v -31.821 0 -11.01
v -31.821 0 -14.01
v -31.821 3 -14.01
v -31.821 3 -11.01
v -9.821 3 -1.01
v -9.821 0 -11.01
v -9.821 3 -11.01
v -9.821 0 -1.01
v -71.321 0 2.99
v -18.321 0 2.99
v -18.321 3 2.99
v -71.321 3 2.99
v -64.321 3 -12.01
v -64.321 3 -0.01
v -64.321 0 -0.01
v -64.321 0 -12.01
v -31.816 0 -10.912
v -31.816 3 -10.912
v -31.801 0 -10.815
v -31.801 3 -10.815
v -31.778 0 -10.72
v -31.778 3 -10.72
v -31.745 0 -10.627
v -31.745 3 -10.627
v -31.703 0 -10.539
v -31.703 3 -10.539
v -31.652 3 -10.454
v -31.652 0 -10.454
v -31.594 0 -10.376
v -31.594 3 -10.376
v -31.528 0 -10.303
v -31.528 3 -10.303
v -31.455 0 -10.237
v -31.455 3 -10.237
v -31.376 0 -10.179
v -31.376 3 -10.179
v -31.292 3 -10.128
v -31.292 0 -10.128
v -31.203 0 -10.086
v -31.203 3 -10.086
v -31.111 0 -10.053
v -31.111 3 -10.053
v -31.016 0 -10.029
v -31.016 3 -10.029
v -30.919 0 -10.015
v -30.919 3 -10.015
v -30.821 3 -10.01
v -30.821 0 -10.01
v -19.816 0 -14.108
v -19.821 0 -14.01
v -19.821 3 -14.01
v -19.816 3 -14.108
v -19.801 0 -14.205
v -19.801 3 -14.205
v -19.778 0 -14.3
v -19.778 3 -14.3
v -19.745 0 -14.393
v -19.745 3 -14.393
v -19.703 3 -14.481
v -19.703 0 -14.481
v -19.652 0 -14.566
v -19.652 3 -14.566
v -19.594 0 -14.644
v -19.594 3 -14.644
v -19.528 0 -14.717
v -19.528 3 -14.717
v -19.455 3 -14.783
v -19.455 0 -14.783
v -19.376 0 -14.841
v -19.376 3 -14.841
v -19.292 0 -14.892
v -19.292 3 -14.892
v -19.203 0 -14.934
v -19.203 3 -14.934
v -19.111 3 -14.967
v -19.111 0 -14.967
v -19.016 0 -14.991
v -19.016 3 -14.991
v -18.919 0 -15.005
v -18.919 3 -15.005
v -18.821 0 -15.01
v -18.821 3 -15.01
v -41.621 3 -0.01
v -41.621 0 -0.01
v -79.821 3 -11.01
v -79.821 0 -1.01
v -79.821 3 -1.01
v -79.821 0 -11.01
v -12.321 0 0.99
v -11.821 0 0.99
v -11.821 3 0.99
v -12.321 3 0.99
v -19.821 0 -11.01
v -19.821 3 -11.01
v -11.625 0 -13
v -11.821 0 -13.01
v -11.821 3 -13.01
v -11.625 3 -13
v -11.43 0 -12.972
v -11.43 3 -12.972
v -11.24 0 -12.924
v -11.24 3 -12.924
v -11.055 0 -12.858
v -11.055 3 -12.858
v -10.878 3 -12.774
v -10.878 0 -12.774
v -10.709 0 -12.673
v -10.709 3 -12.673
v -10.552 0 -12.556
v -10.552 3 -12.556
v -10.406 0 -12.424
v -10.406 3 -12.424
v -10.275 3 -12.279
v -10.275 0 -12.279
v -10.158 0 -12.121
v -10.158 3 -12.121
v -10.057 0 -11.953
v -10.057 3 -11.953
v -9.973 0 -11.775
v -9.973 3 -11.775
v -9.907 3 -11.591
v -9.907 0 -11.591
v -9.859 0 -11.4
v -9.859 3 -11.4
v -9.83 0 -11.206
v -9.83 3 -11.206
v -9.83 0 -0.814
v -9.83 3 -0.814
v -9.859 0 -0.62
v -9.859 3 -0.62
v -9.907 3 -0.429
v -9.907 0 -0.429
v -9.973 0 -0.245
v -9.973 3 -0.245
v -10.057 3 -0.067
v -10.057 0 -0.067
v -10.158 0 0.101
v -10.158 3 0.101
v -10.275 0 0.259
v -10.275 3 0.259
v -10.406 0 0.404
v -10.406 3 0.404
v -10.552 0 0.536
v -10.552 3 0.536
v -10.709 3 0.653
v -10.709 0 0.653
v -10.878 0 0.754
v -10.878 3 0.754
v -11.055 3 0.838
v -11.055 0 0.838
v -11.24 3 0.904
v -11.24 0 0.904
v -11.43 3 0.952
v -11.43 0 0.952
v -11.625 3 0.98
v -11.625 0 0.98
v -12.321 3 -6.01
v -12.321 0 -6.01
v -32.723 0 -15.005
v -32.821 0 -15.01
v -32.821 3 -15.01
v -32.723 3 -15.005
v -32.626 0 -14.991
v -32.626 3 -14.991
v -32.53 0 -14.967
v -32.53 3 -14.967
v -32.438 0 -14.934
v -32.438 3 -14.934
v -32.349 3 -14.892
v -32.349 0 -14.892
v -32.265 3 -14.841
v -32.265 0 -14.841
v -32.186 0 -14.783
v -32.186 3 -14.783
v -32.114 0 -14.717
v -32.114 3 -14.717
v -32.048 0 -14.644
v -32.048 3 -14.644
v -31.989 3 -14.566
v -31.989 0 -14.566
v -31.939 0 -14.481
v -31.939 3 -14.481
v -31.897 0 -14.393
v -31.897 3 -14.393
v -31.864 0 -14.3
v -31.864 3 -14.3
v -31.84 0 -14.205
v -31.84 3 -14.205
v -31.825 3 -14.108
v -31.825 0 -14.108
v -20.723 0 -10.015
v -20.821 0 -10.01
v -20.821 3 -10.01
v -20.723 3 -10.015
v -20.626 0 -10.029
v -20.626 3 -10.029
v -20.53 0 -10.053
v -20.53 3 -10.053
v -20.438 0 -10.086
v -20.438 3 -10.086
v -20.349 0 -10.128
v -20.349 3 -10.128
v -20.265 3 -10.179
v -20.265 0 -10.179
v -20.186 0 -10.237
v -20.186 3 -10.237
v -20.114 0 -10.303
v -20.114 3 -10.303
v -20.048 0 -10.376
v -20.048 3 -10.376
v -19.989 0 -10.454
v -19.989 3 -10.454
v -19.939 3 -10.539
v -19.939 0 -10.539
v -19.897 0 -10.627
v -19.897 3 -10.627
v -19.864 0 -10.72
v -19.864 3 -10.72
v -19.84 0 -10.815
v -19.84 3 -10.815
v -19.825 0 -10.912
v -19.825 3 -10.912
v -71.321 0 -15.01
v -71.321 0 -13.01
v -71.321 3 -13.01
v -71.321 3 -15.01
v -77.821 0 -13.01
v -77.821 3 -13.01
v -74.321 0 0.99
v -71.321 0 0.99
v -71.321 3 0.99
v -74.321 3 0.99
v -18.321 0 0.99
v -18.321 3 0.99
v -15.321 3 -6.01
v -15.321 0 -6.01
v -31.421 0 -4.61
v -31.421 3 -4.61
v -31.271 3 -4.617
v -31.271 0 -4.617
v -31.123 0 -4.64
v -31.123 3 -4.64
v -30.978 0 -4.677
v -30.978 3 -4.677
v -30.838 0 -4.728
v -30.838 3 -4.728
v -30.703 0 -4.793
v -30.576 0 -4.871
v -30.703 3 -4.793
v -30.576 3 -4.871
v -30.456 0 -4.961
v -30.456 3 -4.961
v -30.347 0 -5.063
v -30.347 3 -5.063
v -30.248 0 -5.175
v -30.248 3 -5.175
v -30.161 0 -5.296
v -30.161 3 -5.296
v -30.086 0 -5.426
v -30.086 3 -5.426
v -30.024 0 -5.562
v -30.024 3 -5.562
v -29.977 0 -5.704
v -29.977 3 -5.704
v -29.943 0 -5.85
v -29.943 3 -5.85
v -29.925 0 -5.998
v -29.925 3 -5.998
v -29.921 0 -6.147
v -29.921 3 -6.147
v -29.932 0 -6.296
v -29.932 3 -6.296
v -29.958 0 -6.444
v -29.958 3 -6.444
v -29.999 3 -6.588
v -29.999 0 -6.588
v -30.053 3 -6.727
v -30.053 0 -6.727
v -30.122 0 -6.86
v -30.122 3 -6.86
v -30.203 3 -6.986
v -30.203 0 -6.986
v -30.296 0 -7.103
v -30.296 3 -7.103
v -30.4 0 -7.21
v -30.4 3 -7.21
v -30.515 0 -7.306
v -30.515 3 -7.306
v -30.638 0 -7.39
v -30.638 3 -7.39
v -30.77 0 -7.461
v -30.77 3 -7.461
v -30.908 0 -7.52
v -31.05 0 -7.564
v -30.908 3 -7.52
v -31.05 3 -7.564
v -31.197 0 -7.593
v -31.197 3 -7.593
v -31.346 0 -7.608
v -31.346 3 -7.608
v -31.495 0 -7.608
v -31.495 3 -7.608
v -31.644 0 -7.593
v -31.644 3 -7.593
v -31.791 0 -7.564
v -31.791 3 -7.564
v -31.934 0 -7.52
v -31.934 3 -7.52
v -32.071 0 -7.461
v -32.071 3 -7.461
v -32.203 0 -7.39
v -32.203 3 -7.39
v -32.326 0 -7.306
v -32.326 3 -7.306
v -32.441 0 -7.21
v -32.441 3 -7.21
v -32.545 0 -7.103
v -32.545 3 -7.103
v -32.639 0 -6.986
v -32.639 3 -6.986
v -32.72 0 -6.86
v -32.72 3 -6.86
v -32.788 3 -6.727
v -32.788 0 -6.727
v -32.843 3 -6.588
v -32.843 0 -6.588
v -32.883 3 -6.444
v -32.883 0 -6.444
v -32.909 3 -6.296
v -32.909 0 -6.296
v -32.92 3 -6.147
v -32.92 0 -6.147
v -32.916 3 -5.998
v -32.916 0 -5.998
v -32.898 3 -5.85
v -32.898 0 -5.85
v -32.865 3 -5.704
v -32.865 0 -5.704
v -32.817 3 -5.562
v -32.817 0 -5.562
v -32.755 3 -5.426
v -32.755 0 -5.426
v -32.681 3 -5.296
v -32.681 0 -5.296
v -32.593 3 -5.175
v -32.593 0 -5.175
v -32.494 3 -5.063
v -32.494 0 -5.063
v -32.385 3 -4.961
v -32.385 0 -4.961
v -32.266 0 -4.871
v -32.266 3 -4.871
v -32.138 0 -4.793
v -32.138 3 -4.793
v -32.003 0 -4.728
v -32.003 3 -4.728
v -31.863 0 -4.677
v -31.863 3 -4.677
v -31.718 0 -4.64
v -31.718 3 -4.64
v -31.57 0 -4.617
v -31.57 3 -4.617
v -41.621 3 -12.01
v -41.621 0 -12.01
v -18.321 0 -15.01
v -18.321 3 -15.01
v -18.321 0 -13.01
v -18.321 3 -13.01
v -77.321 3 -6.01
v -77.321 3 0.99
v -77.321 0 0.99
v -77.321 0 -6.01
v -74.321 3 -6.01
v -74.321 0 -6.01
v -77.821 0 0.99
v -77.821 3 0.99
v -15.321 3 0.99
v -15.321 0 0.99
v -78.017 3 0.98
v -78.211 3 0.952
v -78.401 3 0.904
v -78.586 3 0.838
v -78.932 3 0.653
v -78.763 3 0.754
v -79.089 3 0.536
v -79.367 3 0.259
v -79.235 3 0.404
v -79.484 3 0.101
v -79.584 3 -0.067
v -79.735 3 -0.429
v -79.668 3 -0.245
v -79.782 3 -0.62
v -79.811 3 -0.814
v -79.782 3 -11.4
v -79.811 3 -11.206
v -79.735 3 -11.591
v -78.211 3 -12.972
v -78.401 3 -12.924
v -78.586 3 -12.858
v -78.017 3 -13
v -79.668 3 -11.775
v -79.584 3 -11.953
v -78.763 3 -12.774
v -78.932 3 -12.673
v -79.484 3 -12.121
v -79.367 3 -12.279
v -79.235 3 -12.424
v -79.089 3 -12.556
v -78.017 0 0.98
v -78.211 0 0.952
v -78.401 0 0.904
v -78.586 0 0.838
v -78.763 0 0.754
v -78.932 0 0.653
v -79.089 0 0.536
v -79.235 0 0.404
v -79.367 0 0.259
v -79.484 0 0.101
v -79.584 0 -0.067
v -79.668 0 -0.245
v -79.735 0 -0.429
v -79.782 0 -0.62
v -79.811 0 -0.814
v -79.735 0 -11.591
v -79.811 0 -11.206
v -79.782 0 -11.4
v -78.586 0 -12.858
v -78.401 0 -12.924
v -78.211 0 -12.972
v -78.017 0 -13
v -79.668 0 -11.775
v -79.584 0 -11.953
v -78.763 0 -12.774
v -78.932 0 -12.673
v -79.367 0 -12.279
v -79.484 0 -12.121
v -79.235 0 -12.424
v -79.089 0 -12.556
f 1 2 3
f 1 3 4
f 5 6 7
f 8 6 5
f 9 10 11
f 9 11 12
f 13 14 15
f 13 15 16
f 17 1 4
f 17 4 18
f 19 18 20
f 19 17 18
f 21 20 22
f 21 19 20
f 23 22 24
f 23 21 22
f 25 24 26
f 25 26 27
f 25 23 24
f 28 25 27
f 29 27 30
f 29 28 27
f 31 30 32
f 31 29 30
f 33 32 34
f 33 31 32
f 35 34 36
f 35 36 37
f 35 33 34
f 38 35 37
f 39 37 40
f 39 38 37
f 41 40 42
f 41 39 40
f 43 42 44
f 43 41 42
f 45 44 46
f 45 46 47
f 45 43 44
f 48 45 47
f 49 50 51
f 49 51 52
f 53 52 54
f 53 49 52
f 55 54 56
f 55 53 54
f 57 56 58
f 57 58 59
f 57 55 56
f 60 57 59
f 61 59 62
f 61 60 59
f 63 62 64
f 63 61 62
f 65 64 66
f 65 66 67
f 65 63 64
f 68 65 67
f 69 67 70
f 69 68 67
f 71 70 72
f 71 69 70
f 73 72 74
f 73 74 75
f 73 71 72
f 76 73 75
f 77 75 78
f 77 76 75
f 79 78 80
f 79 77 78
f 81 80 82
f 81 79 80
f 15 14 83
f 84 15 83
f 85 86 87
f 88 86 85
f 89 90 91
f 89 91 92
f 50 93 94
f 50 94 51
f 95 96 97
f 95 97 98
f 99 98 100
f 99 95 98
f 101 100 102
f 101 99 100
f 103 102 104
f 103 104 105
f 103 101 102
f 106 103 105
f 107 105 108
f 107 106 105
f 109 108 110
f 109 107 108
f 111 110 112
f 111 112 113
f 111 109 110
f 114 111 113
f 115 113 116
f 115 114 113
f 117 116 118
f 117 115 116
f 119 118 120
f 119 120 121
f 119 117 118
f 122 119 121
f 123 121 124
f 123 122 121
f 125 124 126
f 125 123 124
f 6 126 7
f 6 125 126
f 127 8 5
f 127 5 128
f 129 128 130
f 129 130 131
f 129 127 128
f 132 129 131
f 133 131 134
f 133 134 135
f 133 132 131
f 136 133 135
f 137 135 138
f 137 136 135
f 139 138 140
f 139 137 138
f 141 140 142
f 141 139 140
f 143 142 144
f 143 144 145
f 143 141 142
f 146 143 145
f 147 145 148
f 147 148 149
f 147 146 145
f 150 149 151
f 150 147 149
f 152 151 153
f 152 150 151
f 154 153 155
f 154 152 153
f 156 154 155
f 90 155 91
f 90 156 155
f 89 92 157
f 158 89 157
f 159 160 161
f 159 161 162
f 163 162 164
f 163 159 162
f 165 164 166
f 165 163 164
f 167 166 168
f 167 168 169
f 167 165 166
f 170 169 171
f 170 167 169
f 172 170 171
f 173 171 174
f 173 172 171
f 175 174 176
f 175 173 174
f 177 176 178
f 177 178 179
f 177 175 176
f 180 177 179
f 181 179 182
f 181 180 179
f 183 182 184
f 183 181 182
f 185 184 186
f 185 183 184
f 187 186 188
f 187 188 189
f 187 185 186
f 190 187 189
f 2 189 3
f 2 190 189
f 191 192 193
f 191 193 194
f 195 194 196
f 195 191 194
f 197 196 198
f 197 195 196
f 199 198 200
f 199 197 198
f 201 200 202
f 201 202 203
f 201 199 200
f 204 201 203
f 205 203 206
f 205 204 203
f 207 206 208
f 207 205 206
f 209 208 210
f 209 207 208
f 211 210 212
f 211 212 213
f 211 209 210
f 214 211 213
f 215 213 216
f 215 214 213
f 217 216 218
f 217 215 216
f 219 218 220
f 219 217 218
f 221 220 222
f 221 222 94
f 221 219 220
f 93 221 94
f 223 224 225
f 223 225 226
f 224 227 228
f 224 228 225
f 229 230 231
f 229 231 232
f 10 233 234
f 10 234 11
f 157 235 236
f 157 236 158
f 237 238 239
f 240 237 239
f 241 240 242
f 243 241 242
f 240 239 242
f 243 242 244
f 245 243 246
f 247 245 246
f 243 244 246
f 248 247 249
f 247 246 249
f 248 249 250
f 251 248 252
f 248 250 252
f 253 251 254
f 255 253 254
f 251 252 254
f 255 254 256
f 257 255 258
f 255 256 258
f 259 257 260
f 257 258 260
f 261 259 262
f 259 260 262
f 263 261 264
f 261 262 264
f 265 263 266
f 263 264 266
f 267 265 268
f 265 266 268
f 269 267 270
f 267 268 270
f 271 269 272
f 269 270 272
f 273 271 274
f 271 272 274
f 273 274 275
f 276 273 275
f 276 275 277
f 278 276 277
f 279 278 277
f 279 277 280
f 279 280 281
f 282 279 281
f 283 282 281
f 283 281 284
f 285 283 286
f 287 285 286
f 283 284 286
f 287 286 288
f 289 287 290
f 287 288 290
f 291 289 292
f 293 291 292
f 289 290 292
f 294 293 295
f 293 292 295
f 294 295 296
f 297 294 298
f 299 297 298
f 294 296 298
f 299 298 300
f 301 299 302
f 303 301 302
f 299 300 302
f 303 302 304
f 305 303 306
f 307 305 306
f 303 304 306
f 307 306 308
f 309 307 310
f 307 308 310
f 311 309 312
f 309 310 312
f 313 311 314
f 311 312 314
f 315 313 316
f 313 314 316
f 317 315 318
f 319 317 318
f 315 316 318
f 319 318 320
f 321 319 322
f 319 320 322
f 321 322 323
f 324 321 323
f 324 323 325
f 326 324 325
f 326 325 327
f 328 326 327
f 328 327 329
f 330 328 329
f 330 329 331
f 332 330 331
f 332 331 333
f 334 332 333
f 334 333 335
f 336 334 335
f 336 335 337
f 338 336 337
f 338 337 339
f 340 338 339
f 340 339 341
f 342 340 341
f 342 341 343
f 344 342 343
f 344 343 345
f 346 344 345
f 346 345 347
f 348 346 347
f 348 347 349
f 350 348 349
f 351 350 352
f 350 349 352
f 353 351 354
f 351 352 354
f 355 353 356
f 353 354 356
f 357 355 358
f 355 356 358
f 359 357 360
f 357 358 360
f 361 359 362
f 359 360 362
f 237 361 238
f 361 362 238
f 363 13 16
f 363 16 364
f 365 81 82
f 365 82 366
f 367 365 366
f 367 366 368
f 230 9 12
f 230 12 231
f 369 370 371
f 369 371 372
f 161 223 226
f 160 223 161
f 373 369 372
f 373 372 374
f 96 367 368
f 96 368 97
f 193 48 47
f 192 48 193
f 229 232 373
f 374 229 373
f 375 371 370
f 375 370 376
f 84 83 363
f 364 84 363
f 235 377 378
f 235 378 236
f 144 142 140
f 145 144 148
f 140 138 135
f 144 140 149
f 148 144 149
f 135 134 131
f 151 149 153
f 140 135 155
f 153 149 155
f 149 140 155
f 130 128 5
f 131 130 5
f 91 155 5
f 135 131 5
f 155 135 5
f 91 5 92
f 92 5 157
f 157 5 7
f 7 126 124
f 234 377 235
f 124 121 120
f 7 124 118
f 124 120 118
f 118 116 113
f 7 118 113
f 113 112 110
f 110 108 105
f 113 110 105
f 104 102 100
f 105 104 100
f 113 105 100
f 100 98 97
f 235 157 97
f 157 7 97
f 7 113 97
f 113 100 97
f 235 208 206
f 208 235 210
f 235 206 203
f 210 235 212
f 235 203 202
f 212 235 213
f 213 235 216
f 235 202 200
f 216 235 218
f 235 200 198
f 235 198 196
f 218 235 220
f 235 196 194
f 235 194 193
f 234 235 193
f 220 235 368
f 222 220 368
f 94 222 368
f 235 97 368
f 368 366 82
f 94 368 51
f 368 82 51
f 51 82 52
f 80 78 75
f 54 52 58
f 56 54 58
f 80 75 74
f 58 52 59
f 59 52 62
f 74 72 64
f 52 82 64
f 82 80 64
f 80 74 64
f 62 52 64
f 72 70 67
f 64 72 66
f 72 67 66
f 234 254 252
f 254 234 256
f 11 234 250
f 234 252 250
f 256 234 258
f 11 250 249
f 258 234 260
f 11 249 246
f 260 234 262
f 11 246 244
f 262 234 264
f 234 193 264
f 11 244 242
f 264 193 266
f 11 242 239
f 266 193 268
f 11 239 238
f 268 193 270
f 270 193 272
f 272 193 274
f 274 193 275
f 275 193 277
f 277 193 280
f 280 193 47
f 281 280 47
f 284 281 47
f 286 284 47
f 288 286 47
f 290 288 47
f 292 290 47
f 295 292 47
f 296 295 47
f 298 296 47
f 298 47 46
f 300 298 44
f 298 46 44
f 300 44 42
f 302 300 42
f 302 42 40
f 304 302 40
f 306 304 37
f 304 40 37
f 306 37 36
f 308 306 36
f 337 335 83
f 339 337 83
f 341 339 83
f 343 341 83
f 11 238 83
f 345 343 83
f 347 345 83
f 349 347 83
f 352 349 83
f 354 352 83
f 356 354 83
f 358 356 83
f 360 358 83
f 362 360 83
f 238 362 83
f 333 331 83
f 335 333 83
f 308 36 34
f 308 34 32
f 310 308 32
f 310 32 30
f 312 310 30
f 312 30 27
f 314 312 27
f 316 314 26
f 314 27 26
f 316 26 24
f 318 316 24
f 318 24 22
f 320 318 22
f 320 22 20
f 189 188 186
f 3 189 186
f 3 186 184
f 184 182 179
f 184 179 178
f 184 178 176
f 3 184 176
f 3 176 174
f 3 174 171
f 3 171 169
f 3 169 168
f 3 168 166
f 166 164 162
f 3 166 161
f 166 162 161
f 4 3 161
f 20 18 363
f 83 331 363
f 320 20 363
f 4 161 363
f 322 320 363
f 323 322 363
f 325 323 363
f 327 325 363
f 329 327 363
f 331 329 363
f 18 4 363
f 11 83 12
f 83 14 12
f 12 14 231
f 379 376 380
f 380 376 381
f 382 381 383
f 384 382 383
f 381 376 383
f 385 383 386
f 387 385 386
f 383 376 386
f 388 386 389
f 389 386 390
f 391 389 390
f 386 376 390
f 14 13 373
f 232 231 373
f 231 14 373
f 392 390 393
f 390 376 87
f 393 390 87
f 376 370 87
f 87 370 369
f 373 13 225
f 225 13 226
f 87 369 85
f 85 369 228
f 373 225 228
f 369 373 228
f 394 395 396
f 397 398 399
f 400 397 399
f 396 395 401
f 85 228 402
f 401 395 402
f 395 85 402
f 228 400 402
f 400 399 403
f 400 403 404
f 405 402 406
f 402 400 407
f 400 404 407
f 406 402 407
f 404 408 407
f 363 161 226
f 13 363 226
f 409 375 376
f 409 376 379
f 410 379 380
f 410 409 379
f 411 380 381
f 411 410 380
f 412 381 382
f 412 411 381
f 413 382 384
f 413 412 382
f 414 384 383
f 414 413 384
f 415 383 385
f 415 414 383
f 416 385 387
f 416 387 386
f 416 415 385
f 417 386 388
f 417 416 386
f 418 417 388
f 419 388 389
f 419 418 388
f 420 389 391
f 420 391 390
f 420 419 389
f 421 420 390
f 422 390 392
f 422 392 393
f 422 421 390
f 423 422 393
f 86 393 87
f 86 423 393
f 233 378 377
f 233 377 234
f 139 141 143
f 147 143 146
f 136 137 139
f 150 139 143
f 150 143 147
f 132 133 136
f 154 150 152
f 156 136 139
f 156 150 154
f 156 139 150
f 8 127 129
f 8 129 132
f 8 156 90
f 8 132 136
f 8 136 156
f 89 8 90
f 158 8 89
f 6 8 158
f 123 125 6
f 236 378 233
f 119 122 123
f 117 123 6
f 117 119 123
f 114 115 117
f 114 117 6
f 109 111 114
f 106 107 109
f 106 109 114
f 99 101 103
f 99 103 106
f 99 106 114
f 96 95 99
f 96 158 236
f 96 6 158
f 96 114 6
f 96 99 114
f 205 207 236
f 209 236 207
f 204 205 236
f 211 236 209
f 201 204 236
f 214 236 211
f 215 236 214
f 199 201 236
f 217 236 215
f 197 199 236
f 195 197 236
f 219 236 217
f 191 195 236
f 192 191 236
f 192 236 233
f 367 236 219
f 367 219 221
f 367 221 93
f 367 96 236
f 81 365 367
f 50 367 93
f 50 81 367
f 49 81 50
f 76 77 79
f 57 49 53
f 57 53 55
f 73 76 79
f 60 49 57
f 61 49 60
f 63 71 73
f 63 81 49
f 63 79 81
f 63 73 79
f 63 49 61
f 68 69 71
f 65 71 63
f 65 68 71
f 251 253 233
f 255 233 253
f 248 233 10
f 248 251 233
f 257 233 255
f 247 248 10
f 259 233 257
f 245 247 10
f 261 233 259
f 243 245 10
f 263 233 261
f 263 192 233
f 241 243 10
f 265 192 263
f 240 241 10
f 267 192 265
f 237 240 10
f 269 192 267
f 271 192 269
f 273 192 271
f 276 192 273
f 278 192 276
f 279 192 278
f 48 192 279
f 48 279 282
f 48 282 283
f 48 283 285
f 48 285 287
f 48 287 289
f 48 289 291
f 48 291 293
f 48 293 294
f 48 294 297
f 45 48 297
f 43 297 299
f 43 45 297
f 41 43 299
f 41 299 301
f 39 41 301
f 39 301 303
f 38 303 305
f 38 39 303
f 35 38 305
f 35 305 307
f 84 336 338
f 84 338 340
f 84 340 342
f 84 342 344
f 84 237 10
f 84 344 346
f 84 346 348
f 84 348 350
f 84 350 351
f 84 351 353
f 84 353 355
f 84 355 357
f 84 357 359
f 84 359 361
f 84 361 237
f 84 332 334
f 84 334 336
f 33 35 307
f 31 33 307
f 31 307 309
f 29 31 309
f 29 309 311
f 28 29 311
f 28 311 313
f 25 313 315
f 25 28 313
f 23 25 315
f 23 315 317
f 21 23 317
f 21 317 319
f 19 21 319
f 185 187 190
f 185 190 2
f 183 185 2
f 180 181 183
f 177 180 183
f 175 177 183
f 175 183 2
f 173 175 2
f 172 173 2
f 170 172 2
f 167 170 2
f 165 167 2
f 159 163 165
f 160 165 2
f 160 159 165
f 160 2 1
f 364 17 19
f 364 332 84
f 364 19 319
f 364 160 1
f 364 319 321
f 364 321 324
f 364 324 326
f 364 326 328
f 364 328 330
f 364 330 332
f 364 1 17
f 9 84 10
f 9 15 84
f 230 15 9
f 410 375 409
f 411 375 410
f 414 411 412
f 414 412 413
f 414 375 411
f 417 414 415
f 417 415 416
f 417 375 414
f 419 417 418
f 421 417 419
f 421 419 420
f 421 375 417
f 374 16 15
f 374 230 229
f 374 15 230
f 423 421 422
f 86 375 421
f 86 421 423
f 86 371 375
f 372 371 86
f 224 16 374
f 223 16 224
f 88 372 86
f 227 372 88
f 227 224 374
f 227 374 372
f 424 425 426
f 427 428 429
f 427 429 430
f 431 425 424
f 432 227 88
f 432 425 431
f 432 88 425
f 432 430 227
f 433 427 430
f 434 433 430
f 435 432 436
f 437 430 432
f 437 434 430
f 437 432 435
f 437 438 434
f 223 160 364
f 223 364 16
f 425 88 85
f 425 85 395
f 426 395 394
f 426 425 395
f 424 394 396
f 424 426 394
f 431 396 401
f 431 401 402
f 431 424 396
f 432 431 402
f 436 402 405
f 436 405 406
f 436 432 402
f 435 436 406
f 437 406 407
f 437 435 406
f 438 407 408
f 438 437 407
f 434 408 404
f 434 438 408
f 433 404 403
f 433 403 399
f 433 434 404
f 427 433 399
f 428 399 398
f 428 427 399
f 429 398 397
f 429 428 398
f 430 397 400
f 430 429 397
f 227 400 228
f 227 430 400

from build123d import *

# Parameters (mm, degrees)
BOSS_EXTRUDE1_DEPTH = 3
SKETCH2_W           = 22.7
SKETCH2_H           = 12
CUT_EXTRUDE1_DEPTH  = 3
SKETCH3_W           = 3
SKETCH3_H           = 7
CUT_EXTRUDE2_DEPTH  = 3
SKETCH4_R           = 1.5
CUT_EXTRUDE3_DEPTH  = 3


with BuildPart() as part:
    # Sketch1 → Boss-Extrude1 (new body)
    with BuildSketch(Plane(origin=(0, 0, 0), x_dir=(1, 0, 0), z_dir=(0, 1, 0))):
        with BuildLine():
            Line((-9.820632273, 11.009972833), (-9.820632273, 1.009972833))
            ThreePointArc((-9.820632273, 1.009972833), (-10.40641871, -0.404240729), (-11.820632273, -0.990027167))
            Line((-11.820632273, -0.990027167), (-18.320632273, -0.990027167))
            Line((-18.320632273, -0.990027167), (-18.320632273, -2.990027167))
            Line((-18.320632273, -2.990027167), (-71.320632273, -2.990027167))
            Line((-71.320632273, -2.990027167), (-71.320632273, -0.990027167))
            Line((-71.320632273, -0.990027167), (-77.820632273, -0.990027167))
            ThreePointArc((-77.820632273, -0.990027167), (-79.234845835, -0.404240729), (-79.820632273, 1.009972833))
            Line((-79.820632273, 1.009972833), (-79.820632273, 11.009972833))
            ThreePointArc((-79.820632273, 11.009972833), (-79.234845835, 12.424186396), (-77.820632273, 13.009972833))
            Line((-77.820632273, 13.009972833), (-71.320632273, 13.009972833))
            Line((-71.320632273, 13.009972833), (-71.320632273, 15.009972833))
            Line((-71.320632273, 15.009972833), (-32.820632273, 15.009972833))
            ThreePointArc((-32.820632273, 15.009972833), (-32.113525492, 14.717079615), (-31.820632273, 14.009972833))
            Line((-31.820632273, 14.009972833), (-31.820632273, 11.009972833))
            ThreePointArc((-31.820632273, 11.009972833), (-31.527739054, 10.302866052), (-30.820632273, 10.009972833))
            Line((-30.820632273, 10.009972833), (-20.820632273, 10.009972833))
            ThreePointArc((-20.820632273, 10.009972833), (-20.113525492, 10.302866052), (-19.820632273, 11.009972833))
            Line((-19.820632273, 11.009972833), (-19.820632273, 14.009972833))
            ThreePointArc((-19.820632273, 14.009972833), (-19.527739054, 14.717079615), (-18.820632273, 15.009972833))
            Line((-18.820632273, 15.009972833), (-18.320632273, 15.009972833))
            Line((-18.320632273, 15.009972833), (-18.320632273, 13.009972833))
            Line((-18.320632273, 13.009972833), (-11.820632273, 13.009972833))
            ThreePointArc((-11.820632273, 13.009972833), (-10.40641871, 12.424186396), (-9.820632273, 11.009972833))
        make_face()
    extrude(amount=BOSS_EXTRUDE1_DEPTH)

    # Sketch2 → Cut-Extrude1 (cut)
    with BuildSketch(Plane(origin=(0, 3, 0), x_dir=(1, 0, 0), z_dir=(0, 1, 0))):
        with Locations((-52.970632273, 6.009972833)):
            Rectangle(SKETCH2_W, SKETCH2_H)
    extrude(amount=-CUT_EXTRUDE1_DEPTH, mode=Mode.SUBTRACT)

    # Sketch3 → Cut-Extrude2 (cut)
    with BuildSketch(Plane(origin=(0, 3, 0), x_dir=(1, 0, 0), z_dir=(0, 1, 0))):
        with Locations((-13.820632273, 2.509972833)):
            Rectangle(SKETCH3_W, SKETCH3_H)
        with Locations((-75.820632273, 2.509972833)):
            Rectangle(SKETCH3_W, SKETCH3_H)
    extrude(amount=-CUT_EXTRUDE2_DEPTH, mode=Mode.SUBTRACT)

    # Sketch4 → Cut-Extrude3 (cut)
    with BuildSketch(Plane(origin=(0, 3, 0), x_dir=(1, 0, 0), z_dir=(0, 1, 0))):
        with Locations(Location((-31.420632273, 6.109972833, 0), (0, 0, 270))):
            Circle(SKETCH4_R)
    extrude(amount=-CUT_EXTRUDE3_DEPTH, mode=Mode.SUBTRACT)


solid = part.part
